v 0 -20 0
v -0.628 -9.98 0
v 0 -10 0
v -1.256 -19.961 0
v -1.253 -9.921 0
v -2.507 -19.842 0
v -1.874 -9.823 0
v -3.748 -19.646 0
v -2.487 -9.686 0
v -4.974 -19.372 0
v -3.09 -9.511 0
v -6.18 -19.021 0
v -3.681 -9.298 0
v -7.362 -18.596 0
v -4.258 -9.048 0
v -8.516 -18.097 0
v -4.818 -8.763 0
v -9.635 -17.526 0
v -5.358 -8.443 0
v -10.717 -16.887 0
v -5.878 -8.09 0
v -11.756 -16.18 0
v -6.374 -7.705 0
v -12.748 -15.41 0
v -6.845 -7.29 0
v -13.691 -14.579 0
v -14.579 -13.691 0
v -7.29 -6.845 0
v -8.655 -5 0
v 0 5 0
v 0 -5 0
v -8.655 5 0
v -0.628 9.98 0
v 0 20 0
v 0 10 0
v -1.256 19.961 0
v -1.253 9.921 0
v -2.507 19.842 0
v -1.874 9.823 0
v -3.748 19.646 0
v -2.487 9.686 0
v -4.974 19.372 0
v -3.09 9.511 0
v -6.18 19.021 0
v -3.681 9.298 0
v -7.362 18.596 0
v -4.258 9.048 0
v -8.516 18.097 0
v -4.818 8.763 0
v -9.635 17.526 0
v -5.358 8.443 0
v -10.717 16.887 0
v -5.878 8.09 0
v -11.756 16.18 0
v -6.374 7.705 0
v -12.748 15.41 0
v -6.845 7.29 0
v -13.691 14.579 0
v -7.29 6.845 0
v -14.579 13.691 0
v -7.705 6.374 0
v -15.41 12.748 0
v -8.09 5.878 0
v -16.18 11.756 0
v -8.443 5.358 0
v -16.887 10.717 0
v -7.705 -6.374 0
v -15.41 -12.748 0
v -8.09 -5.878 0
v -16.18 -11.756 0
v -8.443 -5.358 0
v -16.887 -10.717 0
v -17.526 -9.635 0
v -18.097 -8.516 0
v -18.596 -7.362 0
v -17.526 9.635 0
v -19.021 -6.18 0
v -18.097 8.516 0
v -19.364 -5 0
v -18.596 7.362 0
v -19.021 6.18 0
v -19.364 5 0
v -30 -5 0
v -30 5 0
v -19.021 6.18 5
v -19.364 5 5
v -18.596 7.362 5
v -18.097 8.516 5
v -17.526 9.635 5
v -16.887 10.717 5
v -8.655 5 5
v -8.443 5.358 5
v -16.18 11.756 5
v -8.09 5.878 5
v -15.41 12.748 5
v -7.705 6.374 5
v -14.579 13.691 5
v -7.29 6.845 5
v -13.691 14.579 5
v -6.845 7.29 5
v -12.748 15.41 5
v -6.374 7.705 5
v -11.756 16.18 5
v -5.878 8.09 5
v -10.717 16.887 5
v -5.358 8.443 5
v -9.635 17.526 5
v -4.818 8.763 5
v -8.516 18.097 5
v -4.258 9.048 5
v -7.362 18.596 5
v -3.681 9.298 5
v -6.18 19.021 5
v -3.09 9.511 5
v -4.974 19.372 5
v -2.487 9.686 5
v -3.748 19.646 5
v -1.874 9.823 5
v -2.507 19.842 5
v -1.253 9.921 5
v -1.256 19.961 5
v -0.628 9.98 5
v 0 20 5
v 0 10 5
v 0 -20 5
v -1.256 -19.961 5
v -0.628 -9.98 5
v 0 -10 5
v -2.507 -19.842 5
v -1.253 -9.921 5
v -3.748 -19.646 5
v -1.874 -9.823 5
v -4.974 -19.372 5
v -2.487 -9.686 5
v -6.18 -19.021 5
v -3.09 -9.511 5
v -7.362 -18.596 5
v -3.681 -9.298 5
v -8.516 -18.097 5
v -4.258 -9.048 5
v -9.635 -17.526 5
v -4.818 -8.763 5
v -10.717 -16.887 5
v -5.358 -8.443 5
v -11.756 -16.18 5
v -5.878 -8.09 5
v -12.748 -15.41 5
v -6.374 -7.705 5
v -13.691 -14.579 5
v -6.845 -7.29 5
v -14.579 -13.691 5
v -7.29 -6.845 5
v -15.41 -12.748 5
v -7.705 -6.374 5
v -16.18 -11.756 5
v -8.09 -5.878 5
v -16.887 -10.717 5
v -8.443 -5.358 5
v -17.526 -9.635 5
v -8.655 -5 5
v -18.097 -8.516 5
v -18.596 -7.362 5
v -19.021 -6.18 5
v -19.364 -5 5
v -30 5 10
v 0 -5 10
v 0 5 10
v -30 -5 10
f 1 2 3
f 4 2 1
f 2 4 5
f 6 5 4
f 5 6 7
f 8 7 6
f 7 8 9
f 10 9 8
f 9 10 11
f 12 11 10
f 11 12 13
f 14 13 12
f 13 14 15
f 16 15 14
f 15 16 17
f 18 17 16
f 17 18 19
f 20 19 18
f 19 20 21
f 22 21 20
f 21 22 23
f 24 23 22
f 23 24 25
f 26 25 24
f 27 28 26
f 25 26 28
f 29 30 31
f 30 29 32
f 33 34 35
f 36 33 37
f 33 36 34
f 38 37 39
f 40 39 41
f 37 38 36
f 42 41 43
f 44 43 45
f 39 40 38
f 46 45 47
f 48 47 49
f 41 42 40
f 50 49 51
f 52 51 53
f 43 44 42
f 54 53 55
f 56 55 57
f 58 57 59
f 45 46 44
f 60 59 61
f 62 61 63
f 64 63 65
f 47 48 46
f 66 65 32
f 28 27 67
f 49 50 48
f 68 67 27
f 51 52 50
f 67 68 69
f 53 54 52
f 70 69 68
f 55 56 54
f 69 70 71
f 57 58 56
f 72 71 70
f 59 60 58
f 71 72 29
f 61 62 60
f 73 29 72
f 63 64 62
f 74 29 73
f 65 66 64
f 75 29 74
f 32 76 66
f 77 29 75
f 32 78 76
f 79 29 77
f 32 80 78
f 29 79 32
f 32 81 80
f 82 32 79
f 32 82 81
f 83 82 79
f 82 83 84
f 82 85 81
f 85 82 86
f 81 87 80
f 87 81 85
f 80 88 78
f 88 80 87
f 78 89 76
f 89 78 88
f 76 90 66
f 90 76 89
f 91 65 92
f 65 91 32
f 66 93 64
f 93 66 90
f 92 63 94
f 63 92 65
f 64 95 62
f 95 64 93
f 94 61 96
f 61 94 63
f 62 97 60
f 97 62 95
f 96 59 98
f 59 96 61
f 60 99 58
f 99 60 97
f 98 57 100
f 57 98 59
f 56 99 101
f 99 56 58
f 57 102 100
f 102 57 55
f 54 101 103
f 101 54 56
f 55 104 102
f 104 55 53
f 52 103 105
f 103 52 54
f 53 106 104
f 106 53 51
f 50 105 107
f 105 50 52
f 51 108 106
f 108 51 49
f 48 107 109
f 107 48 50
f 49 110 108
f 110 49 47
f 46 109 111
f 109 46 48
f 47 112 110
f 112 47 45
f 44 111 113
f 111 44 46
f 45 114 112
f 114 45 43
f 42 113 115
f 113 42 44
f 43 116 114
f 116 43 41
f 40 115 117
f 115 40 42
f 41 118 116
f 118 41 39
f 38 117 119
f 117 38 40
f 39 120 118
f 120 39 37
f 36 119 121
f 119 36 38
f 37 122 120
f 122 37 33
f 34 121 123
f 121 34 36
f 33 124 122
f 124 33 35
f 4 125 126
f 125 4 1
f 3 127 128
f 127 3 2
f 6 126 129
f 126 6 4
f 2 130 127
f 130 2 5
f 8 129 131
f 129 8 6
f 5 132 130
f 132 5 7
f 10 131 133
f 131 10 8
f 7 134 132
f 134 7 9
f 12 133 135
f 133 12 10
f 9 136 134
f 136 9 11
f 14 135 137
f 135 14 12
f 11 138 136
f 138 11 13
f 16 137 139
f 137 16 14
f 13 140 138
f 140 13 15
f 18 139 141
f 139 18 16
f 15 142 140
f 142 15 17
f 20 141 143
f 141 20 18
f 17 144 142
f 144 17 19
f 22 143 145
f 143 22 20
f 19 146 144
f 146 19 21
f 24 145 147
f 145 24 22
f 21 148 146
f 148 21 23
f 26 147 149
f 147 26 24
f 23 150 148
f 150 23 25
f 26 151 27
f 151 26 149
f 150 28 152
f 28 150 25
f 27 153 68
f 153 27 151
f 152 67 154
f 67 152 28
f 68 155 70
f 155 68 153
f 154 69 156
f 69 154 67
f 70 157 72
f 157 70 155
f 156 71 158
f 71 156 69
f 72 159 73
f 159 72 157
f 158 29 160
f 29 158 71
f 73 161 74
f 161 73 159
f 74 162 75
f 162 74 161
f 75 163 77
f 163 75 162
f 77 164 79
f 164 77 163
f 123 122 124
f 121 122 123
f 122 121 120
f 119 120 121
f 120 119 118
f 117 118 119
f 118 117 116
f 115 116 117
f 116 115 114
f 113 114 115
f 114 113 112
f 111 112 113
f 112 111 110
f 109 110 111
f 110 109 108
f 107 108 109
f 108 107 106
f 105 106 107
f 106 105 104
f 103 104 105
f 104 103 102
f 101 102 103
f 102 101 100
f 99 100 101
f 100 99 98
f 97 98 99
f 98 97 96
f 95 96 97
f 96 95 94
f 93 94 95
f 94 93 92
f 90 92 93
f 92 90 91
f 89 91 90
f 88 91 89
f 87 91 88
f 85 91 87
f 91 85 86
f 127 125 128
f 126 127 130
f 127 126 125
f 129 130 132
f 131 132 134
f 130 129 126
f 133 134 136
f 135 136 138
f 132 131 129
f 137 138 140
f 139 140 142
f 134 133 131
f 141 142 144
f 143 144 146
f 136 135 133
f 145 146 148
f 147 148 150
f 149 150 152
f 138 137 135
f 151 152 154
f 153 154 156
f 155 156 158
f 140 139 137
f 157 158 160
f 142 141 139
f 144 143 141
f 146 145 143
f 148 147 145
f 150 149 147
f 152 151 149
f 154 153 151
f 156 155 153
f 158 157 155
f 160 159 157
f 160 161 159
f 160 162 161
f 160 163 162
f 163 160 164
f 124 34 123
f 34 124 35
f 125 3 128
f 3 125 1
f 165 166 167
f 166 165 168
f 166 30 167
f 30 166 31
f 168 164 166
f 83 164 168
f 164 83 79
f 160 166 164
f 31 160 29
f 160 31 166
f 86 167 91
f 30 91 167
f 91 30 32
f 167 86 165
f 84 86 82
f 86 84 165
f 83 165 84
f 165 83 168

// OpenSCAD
// The width and height of each basswood piece (in mm)
basswood_dimentions = 1;
// The diameter of the lower arch of the bridge
lower_arc_diameter = 250;

// The lower arc of the bridge
arc(basswood_dimentions * 10, basswood_dimentions * 5, /*lower_arc_diameter/2*/20, 180);


// This measures an arc of (10,5,125,180) to have a height of 105 
// An arc of (10,5,40,180) has a height of ~30
cube_height = 10;
rotate([0,0,180]) {
    translate([0,-5,0])
        cube(cube_height,cube_height,cube_height);
    translate([cube_height,-5,0])
        cube(cube_height,cube_height,cube_height);
    translate([cube_height*2,-5,0])
        cube(cube_height,cube_height,cube_height);
    //translate([cube_height*3,-5,0])
      //  cube(cube_height,cube_height,cube_height);
    //translate([cube_height*4,-5,0])
      //  cube(cube_height,cube_height,cube_height);
    //translate([cube_height*5,-5,0])
      //  cube(cube_height,cube_height,cube_height);
    //translate([cube_height*6,-5,0])
      //  cube(cube_height,cube_height,cube_height);
    //translate([cube_height*7,-5,0])
      //  cube(cube_height,cube_height,cube_height);
    //translate([cube_height*8,-5,0])
        //cube(cube_height,cube_height,cube_height);
    //translate([cube_height*9,-5,0])
        //cube(cube_height,cube_height,cube_height);
    //translate([cube_height*10,-5,0])
      //  cube(cube_height,cube_height,cube_height);
    //translate([cube_height*11,-5,0])
        //cube(cube_height,cube_height,cube_height);
}
/* 
 * Excerpt from... 
 * 
 * Parametric Encoder Wheel 
 *
 * by Alex Franke (codecreations), March 2012
 * http://www.theFrankes.com
 * 
 * Licenced under Creative Commons Attribution - Non-Commercial - Share Alike 3.0 
 * Height = X-Axis width of arc
 * Depth = The Z-Axis value of the arc
 * Radius = Half of the Y-Axis value for the length of this arch
 * Degrees = How many degrees of the arch to make (180 = full arch, 90 = half an arch)
 */
module arc( height, depth, radius, degrees ) {
    // This dies a horible death if it's not rendered here 
    // -- sucks up all memory and spins out of control 
    render() {
        difference() {
            // Outer ring
            rotate_extrude($fn = 100)
                translate([radius - height, 0, 0])
                    square([height,depth]);
         
            // Cut half off
            translate([0,-(radius+1),-.5]) 
                cube ([radius+1,(radius+1)*2,depth+1]);
         
            // Cover the other half as necessary
            rotate([0,0,180-degrees])
            translate([0,-(radius+1),-.5]) 
                cube ([radius+1,(radius+1)*2,depth+1]);
         
        }
    }
}
